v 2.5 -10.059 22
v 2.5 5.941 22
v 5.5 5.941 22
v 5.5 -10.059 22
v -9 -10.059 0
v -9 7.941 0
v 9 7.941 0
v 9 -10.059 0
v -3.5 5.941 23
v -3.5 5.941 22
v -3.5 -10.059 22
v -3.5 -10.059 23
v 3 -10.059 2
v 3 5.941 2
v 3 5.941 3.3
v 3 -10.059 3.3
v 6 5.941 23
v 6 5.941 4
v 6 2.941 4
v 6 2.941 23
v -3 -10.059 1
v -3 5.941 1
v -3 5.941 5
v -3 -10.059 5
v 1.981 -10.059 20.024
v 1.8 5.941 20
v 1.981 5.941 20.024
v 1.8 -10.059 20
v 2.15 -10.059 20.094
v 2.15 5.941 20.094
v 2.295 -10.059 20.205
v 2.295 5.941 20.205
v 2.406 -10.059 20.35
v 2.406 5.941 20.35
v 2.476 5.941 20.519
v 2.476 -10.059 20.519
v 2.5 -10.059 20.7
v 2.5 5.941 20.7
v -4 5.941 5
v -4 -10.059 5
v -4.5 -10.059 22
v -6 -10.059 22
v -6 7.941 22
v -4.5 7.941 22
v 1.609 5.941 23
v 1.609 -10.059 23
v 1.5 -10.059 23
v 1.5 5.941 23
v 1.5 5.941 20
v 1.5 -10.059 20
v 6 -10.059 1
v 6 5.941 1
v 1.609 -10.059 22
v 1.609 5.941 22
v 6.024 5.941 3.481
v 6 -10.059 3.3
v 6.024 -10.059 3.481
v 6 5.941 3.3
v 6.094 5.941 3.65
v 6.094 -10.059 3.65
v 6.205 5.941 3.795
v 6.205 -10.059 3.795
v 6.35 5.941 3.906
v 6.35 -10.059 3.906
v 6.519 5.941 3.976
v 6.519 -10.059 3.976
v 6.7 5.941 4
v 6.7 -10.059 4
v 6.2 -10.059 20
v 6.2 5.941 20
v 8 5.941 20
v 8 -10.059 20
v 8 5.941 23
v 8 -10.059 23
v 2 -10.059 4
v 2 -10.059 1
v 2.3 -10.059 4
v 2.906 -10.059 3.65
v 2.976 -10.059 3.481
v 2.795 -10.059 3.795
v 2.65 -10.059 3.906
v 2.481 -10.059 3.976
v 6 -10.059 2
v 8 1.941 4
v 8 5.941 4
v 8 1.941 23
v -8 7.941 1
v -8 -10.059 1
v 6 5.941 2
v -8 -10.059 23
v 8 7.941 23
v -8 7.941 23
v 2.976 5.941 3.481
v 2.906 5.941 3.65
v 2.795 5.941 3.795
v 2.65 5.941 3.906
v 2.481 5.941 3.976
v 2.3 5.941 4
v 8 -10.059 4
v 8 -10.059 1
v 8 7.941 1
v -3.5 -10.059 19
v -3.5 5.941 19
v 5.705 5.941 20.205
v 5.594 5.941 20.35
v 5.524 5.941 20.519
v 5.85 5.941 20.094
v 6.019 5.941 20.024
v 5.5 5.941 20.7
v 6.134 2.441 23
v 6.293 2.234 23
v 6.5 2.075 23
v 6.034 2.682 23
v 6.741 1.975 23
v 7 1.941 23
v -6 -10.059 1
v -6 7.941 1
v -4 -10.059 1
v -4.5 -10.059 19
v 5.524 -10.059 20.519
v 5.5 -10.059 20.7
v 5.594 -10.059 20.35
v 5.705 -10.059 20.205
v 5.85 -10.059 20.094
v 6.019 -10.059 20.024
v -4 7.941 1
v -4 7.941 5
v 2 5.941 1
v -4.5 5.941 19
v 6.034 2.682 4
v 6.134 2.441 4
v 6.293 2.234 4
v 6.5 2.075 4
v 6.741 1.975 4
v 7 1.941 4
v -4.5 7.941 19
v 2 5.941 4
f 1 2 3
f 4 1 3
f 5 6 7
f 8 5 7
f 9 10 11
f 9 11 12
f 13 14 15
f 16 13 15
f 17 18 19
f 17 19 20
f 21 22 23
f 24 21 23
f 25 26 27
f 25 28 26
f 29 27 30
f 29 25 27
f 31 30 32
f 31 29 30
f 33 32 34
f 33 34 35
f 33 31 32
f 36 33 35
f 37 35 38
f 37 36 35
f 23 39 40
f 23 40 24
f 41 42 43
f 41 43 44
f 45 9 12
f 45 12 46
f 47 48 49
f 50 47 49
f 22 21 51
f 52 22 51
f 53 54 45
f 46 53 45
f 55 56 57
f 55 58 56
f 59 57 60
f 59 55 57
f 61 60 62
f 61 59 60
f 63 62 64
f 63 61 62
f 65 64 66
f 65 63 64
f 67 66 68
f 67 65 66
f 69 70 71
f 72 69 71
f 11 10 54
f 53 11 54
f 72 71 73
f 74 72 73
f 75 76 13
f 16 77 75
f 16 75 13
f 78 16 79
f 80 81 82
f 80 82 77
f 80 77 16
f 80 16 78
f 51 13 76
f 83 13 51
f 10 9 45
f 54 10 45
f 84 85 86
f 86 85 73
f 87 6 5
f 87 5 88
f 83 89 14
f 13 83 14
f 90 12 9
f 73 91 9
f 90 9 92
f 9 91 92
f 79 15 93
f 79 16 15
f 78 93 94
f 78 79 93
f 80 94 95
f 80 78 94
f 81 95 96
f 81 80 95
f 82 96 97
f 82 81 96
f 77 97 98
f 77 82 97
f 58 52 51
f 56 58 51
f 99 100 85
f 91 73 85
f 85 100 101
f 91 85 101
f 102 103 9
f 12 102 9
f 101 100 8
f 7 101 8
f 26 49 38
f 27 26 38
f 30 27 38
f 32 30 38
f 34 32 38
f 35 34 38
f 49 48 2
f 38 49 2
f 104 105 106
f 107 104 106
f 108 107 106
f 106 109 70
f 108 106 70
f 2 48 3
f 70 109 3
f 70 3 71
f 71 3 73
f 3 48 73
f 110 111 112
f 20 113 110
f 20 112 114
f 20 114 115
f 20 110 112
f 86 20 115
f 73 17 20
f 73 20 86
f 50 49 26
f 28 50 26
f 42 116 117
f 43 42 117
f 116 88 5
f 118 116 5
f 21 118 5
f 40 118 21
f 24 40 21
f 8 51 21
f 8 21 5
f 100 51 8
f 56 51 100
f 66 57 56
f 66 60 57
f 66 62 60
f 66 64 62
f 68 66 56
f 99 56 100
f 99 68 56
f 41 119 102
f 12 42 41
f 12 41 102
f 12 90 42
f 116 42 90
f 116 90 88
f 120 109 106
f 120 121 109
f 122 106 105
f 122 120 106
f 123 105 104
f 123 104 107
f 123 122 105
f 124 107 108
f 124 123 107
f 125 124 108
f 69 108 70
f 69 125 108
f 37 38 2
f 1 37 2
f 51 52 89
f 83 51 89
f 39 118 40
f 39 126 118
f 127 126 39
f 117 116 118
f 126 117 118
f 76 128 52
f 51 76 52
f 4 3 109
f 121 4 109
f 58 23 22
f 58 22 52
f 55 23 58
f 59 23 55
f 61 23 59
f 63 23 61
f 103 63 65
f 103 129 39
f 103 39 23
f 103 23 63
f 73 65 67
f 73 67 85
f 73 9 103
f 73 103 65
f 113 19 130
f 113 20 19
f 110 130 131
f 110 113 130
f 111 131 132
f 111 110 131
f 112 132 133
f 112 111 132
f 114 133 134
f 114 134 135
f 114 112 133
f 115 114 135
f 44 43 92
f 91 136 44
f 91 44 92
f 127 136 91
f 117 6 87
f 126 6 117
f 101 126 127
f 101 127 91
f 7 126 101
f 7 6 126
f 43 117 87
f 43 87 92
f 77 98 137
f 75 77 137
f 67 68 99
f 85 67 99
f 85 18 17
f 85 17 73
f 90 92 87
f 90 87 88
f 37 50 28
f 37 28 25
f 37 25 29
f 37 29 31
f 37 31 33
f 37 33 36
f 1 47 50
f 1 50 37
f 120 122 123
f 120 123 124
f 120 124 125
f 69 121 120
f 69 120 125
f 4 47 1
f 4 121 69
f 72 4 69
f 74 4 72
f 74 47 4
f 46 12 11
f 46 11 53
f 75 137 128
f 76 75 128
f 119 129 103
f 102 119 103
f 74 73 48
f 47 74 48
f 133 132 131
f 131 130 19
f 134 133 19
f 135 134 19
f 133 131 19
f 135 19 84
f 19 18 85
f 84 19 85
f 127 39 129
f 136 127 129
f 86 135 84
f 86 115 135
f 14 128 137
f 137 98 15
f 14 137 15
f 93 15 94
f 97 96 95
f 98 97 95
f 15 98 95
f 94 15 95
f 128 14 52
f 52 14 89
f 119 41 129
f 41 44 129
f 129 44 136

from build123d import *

# Parameters (mm, degrees)
F0_W      = 18
F0_H      = 18
F1_DEPTH  = 1
F3_DEPTH  = 22
F6_W      = 2
F6_H      = 19
F7_DEPTH  = 16
F8_W      = 1
F8_H      = 4
F9_DEPTH  = 16
F10_DEPTH = 25
F12_DEPTH = 16
F13_W     = 2
F13_H     = 19
F14_DEPTH = 2
F16_DEPTH = 4
F17_R     = 0.7
F17_2_R   = 0.7
F17_3_R   = 0.7
F18_R     = 1
F19_W     = 5.1086935602
F19_H     = 1
F20_DEPTH = 16
F22_DEPTH = 25


with BuildPart() as f1:
    # F0 (on Top) → F1 (new body)
    with BuildSketch(Plane.XY):
        with Locations((0, -1.0588235294)):
            Rectangle(F0_W, F0_H)
    extrude(amount=F1_DEPTH)

    # F2 (on face) → F3 (join)
    with BuildSketch(Plane.XY.offset(1)):
        Polygon((6, -10.0588235294), (8, -10.0588235294), (8, 7.9411764706), (-8, 7.9411764706), (-8, -10.0588235294), (-6, -10.0588235294), (-6, 5.9411764706), (6, 5.9411764706), align=None)
    extrude(amount=F3_DEPTH)

    # F5: sweep along a path in F5_path
    with BuildLine(Plane(origin=(-9, -10.0588235294, 0), x_dir=(0, -1, 0), z_dir=(0, 0, -1))) as f5_path:
        Line((0, 0), (-18, 0))
    # F4 (on face) → F5 (sweep, cut)
    with BuildSketch(Plane.XZ.offset(10.0588235294)):
        Polygon((-9, 1), (-9, 0), (-8, 1), align=None)
    sweep(path=f5_path.line, mode=Mode.SUBTRACT)

    # F6 (on face) → F7 (cut, through all)
    with BuildSketch(Plane.XZ.offset(10.0588235294)):
        with Locations((7, 13.5)):
            Rectangle(F6_W, F6_H)
    extrude(amount=-F7_DEPTH, mode=Mode.SUBTRACT)

    # F8 (on face) → F9 (join, through all)
    with BuildSketch(Plane.XZ.offset(-5.9411764706)):
        Polygon((-3.5, 23), (-6, 23), (-6, 22), (-4.5, 22), (-4.5, 19), (-3.5, 19), align=None)
        with Locations((-3.5, 3)):
            Rectangle(F8_W, F8_H)
    extrude(amount=F9_DEPTH)

    # F4 (on face) → F10 (cut)
    with BuildSketch(Plane.XZ.offset(10.0588235294)):
        Polygon((8, 1), (9, 0), (9, 1), align=None)
    extrude(amount=-F10_DEPTH, mode=Mode.SUBTRACT)

    # F17
    f17_edges = [f1.edges().sort_by_distance(p)[0] for p in [
        (6, -2.058824, 4),
    ]]
    fillet(f17_edges, radius=F17_R)

    # F21 (on face) → F22 (cut)
    with BuildSketch(Plane.XZ.offset(-5.9411764706)):
        Polygon((-4, 1), (-4, 5), (-4.5, 19), (-4.5, 22), (-6, 22), (-6, 1), align=None)
    extrude(amount=-F22_DEPTH, mode=Mode.SUBTRACT)


with BuildPart() as f12:
    # F11 (on face) → F12 (new body, through all)
    with BuildSketch(Plane.XZ.offset(-5.9411764706)):
        Polygon((2, 1), (6, 1), (6, 2), (3, 2), (3, 4), (2, 4), align=None)
    extrude(amount=F12_DEPTH)

    # F17#2
    f17_2_edges = [f12.edges().sort_by_distance(p)[0] for p in [
        (3, -2.058824, 4),
    ]]
    fillet(f17_2_edges, radius=F17_2_R)


with BuildPart() as f12b:
    # F11 (on face) → F12, piece 2 (new body, through all)
    with BuildSketch(Plane.XZ.offset(-5.9411764706)):
        Polygon((8, 23), (5.5, 23), (1.5, 23), (1.5, 20), (2.5, 20), (2.5, 22), (5.5, 22), (5.5, 20), (8, 20), align=None)
    extrude(amount=F12_DEPTH)

    # F17#3
    f17_3_edges = [f12b.edges().sort_by_distance(p)[0] for p in [
        (2.5, -2.058824, 20),
        (5.5, -2.058824, 20),
    ]]
    fillet(f17_3_edges, radius=F17_3_R)


with BuildPart() as f14:
    # F13 (on face) → F14 (new body)
    with BuildSketch(Plane.XZ.offset(-5.9411764706)):
        with Locations((7, 13.5)):
            Rectangle(F13_W, F13_H)
    extrude(amount=F14_DEPTH)


with BuildPart() as f16:
    # F13 (on face) → F16 (new body)
    with BuildSketch(Plane.XZ.offset(-5.9411764706)):
        with Locations((7, 13.5)):
            Rectangle(F13_W, F13_H)
    extrude(amount=F16_DEPTH)

    # F18
    f18_edges = [f16.edges().sort_by_distance(p)[0] for p in [
        (6, 1.941176, 13.5),
    ]]
    fillet(f18_edges, radius=F18_R)


with BuildPart() as f20:
    # F19 (on face) → F20 (new body, through all)
    with BuildSketch(Plane.XZ.offset(-5.9411764706)):
        with Locations((-0.9456532199, 22.5)):
            Rectangle(F19_W, F19_H)
    extrude(amount=F20_DEPTH)


solid = Compound([f1.part, f12.part, f12b.part, f16.part, f20.part])
